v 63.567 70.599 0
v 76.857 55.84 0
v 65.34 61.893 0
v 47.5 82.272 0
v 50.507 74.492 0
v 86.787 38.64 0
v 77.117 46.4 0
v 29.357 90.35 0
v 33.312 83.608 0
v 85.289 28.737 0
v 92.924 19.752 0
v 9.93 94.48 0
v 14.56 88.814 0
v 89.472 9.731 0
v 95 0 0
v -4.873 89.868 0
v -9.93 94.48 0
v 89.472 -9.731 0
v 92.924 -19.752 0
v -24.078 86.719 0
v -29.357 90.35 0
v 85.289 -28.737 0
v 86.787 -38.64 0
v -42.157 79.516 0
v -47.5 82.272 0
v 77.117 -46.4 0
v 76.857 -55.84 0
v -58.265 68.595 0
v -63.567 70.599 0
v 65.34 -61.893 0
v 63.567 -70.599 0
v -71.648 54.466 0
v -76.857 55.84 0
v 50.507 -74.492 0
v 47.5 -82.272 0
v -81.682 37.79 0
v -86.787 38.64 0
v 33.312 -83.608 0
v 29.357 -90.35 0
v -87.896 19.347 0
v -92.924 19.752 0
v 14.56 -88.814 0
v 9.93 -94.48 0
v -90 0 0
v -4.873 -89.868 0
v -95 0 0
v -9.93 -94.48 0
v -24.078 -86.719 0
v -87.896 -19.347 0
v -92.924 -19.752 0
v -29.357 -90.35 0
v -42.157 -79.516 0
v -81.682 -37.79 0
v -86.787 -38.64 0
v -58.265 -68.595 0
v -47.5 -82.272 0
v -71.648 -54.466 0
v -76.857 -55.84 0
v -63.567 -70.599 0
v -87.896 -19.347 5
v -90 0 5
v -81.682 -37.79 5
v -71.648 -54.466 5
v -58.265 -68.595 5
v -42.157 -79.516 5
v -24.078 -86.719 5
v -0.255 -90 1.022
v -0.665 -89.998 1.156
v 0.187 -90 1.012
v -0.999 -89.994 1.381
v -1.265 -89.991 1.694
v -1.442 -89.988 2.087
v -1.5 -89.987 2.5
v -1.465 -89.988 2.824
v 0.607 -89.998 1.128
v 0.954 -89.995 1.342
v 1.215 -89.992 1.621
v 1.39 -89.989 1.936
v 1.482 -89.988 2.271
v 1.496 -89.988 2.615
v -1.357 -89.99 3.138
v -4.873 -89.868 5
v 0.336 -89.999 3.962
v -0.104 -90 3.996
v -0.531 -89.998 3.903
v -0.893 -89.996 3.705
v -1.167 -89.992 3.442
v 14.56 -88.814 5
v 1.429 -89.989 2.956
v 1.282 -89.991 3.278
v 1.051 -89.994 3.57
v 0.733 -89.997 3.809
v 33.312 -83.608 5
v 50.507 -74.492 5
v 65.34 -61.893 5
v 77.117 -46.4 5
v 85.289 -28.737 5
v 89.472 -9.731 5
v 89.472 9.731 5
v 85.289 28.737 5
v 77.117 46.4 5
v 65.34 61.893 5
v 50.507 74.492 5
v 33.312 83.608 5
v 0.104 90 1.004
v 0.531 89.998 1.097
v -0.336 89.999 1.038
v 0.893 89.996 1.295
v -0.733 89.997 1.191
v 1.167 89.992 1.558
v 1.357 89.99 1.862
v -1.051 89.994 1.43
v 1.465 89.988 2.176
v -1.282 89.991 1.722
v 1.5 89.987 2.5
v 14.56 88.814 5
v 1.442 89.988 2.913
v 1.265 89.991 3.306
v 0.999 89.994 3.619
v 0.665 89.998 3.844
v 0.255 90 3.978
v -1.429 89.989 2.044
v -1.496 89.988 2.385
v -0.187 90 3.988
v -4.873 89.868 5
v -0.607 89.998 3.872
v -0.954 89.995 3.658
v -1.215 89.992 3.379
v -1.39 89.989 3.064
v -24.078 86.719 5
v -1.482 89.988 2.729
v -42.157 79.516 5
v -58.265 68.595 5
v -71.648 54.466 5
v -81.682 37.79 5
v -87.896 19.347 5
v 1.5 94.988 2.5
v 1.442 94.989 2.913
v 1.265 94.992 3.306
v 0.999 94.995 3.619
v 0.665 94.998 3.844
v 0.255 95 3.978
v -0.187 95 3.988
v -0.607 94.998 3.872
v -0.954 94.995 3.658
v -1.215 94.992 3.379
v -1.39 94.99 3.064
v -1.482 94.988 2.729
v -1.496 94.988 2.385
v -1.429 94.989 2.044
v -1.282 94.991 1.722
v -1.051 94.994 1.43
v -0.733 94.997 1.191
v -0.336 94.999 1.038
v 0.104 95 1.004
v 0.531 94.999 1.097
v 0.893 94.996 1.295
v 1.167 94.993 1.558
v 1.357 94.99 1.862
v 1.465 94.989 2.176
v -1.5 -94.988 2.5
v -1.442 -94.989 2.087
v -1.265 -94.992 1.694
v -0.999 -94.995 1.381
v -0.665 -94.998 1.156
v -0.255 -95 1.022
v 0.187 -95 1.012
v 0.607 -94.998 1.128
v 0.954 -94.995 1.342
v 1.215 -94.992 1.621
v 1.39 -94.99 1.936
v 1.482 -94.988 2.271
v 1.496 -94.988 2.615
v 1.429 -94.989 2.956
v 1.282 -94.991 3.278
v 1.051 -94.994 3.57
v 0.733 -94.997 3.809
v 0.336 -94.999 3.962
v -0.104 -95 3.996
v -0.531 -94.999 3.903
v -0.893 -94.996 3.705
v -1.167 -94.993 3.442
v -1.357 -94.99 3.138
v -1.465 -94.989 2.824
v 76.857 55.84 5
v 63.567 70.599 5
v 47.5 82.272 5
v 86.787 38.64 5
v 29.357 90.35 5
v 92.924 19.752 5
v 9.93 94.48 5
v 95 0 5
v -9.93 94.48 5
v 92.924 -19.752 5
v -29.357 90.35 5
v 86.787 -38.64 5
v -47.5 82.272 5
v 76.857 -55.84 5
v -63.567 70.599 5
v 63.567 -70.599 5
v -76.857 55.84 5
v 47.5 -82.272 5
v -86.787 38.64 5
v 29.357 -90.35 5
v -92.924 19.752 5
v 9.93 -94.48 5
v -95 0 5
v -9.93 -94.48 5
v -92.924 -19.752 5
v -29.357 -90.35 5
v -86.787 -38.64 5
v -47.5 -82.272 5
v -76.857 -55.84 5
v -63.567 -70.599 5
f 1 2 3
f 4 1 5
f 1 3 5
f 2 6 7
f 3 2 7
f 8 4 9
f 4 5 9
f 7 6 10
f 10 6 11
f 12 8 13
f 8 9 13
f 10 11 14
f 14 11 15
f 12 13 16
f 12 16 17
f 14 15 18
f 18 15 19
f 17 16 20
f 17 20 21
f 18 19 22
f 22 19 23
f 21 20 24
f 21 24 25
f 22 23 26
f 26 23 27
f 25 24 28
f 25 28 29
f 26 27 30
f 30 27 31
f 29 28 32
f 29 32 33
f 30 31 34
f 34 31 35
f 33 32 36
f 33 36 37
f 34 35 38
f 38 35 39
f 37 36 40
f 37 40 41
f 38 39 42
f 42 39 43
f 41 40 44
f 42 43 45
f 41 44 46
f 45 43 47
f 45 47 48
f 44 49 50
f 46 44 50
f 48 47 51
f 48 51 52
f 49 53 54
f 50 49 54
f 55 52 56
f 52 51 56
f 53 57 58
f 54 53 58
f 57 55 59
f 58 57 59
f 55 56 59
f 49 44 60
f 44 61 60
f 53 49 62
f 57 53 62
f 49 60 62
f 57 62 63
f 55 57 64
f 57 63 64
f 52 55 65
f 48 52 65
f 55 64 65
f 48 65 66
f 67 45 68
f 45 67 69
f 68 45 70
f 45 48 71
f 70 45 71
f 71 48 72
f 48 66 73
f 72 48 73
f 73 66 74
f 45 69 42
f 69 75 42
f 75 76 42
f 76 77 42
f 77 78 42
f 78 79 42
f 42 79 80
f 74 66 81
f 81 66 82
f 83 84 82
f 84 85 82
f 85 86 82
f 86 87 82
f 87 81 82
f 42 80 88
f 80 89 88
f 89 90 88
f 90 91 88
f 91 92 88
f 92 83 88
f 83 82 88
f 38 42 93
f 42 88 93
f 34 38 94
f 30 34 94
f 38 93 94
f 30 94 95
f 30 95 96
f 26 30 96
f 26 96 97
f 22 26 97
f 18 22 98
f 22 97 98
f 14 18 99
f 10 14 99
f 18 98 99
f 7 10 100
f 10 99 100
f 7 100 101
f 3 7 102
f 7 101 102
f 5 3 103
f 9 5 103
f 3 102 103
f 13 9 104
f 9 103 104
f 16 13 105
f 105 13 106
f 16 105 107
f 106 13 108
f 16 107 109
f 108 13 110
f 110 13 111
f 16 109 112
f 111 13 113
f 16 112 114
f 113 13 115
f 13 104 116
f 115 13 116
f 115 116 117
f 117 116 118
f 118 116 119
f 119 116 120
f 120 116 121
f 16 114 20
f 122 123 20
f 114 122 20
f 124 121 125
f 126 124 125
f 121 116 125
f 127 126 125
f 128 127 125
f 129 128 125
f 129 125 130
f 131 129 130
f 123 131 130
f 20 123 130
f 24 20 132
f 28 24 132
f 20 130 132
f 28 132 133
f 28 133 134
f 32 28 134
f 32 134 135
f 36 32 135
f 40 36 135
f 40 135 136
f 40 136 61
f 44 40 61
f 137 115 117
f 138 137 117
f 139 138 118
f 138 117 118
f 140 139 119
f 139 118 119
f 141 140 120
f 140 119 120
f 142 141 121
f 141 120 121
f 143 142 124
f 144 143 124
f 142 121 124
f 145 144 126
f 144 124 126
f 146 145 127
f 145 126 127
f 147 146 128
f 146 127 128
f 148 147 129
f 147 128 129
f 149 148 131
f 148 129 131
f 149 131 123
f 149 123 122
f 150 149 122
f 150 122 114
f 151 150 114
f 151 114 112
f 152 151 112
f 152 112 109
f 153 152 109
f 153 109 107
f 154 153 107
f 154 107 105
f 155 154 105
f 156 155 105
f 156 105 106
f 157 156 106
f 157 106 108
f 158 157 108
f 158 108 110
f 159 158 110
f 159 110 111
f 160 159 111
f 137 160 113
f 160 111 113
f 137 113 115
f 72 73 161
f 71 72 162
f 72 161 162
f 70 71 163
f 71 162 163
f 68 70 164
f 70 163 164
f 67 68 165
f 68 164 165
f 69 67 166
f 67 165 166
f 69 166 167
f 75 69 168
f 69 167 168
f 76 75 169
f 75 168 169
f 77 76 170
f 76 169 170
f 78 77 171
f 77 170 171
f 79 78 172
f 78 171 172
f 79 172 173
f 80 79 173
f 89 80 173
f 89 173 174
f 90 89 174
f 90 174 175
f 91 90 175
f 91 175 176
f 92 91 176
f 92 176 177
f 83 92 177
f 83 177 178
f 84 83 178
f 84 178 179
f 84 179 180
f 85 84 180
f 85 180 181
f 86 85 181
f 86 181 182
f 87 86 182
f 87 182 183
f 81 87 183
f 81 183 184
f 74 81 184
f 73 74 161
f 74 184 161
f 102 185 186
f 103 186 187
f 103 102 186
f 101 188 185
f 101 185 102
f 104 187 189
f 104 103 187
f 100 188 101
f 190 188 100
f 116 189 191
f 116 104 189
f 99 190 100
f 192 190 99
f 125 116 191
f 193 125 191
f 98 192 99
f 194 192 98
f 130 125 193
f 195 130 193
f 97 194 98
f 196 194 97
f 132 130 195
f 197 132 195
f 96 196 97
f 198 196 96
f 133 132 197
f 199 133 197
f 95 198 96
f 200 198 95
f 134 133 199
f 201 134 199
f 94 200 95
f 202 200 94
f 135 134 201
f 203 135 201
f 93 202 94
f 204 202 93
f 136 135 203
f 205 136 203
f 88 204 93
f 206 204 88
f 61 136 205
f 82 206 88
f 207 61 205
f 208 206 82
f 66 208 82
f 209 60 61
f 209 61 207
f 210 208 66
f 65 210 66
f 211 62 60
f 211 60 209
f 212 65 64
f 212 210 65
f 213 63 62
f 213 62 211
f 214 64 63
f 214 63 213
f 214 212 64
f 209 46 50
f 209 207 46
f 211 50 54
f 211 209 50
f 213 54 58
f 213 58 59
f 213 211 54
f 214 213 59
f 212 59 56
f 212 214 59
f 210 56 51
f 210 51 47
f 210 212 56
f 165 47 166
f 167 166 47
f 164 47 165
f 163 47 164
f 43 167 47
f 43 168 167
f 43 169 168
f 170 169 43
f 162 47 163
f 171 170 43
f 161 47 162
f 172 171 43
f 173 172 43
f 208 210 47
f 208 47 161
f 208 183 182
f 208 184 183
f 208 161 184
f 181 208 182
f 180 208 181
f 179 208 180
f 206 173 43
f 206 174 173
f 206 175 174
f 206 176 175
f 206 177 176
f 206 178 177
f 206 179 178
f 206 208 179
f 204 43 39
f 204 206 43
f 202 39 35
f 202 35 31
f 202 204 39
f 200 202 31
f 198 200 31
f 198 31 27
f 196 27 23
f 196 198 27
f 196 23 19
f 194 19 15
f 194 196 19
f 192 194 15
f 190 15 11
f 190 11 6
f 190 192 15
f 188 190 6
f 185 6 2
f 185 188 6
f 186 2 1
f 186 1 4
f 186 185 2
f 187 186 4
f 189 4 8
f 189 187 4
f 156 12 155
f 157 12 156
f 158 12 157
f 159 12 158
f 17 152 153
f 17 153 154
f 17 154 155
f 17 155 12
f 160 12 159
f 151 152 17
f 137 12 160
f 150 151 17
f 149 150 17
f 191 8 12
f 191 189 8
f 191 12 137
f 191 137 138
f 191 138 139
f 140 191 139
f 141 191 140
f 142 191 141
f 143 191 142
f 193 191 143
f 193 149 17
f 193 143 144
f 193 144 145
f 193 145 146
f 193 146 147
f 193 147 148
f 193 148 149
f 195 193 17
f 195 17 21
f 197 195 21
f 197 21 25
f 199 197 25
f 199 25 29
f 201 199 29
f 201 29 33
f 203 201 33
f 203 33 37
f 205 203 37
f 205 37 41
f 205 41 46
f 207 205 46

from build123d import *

# Parameters (mm, degrees)
F0_W     = 5
F0_H     = 5
F2_D     = 3
F2_DEPTH = 95.001
F3_D     = 3


with BuildPart() as f1:
    # F0 (on Front) → F1 (revolve)
    with BuildSketch(Plane.XZ):
        with Locations((-92.5, 2.5)):
            Rectangle(F0_W, F0_H)
    revolve(axis=Axis((0, 0, 1.25), (0, 0, 1)))

    # F2 (through all, one way)
    with BuildSketch(Plane.XZ):
        with Locations((0, 2.5)):
            Circle(F2_D / 2)
    extrude(amount=-F2_DEPTH, mode=Mode.SUBTRACT)

    # F3 (through all)
    with Locations(Plane(origin=(0, 0, 0), x_dir=(1, 0, 0), z_dir=(0, 1, 0))):
        with Locations((0, -2.5)):
            Hole(F3_D / 2)


solid = f1.part
